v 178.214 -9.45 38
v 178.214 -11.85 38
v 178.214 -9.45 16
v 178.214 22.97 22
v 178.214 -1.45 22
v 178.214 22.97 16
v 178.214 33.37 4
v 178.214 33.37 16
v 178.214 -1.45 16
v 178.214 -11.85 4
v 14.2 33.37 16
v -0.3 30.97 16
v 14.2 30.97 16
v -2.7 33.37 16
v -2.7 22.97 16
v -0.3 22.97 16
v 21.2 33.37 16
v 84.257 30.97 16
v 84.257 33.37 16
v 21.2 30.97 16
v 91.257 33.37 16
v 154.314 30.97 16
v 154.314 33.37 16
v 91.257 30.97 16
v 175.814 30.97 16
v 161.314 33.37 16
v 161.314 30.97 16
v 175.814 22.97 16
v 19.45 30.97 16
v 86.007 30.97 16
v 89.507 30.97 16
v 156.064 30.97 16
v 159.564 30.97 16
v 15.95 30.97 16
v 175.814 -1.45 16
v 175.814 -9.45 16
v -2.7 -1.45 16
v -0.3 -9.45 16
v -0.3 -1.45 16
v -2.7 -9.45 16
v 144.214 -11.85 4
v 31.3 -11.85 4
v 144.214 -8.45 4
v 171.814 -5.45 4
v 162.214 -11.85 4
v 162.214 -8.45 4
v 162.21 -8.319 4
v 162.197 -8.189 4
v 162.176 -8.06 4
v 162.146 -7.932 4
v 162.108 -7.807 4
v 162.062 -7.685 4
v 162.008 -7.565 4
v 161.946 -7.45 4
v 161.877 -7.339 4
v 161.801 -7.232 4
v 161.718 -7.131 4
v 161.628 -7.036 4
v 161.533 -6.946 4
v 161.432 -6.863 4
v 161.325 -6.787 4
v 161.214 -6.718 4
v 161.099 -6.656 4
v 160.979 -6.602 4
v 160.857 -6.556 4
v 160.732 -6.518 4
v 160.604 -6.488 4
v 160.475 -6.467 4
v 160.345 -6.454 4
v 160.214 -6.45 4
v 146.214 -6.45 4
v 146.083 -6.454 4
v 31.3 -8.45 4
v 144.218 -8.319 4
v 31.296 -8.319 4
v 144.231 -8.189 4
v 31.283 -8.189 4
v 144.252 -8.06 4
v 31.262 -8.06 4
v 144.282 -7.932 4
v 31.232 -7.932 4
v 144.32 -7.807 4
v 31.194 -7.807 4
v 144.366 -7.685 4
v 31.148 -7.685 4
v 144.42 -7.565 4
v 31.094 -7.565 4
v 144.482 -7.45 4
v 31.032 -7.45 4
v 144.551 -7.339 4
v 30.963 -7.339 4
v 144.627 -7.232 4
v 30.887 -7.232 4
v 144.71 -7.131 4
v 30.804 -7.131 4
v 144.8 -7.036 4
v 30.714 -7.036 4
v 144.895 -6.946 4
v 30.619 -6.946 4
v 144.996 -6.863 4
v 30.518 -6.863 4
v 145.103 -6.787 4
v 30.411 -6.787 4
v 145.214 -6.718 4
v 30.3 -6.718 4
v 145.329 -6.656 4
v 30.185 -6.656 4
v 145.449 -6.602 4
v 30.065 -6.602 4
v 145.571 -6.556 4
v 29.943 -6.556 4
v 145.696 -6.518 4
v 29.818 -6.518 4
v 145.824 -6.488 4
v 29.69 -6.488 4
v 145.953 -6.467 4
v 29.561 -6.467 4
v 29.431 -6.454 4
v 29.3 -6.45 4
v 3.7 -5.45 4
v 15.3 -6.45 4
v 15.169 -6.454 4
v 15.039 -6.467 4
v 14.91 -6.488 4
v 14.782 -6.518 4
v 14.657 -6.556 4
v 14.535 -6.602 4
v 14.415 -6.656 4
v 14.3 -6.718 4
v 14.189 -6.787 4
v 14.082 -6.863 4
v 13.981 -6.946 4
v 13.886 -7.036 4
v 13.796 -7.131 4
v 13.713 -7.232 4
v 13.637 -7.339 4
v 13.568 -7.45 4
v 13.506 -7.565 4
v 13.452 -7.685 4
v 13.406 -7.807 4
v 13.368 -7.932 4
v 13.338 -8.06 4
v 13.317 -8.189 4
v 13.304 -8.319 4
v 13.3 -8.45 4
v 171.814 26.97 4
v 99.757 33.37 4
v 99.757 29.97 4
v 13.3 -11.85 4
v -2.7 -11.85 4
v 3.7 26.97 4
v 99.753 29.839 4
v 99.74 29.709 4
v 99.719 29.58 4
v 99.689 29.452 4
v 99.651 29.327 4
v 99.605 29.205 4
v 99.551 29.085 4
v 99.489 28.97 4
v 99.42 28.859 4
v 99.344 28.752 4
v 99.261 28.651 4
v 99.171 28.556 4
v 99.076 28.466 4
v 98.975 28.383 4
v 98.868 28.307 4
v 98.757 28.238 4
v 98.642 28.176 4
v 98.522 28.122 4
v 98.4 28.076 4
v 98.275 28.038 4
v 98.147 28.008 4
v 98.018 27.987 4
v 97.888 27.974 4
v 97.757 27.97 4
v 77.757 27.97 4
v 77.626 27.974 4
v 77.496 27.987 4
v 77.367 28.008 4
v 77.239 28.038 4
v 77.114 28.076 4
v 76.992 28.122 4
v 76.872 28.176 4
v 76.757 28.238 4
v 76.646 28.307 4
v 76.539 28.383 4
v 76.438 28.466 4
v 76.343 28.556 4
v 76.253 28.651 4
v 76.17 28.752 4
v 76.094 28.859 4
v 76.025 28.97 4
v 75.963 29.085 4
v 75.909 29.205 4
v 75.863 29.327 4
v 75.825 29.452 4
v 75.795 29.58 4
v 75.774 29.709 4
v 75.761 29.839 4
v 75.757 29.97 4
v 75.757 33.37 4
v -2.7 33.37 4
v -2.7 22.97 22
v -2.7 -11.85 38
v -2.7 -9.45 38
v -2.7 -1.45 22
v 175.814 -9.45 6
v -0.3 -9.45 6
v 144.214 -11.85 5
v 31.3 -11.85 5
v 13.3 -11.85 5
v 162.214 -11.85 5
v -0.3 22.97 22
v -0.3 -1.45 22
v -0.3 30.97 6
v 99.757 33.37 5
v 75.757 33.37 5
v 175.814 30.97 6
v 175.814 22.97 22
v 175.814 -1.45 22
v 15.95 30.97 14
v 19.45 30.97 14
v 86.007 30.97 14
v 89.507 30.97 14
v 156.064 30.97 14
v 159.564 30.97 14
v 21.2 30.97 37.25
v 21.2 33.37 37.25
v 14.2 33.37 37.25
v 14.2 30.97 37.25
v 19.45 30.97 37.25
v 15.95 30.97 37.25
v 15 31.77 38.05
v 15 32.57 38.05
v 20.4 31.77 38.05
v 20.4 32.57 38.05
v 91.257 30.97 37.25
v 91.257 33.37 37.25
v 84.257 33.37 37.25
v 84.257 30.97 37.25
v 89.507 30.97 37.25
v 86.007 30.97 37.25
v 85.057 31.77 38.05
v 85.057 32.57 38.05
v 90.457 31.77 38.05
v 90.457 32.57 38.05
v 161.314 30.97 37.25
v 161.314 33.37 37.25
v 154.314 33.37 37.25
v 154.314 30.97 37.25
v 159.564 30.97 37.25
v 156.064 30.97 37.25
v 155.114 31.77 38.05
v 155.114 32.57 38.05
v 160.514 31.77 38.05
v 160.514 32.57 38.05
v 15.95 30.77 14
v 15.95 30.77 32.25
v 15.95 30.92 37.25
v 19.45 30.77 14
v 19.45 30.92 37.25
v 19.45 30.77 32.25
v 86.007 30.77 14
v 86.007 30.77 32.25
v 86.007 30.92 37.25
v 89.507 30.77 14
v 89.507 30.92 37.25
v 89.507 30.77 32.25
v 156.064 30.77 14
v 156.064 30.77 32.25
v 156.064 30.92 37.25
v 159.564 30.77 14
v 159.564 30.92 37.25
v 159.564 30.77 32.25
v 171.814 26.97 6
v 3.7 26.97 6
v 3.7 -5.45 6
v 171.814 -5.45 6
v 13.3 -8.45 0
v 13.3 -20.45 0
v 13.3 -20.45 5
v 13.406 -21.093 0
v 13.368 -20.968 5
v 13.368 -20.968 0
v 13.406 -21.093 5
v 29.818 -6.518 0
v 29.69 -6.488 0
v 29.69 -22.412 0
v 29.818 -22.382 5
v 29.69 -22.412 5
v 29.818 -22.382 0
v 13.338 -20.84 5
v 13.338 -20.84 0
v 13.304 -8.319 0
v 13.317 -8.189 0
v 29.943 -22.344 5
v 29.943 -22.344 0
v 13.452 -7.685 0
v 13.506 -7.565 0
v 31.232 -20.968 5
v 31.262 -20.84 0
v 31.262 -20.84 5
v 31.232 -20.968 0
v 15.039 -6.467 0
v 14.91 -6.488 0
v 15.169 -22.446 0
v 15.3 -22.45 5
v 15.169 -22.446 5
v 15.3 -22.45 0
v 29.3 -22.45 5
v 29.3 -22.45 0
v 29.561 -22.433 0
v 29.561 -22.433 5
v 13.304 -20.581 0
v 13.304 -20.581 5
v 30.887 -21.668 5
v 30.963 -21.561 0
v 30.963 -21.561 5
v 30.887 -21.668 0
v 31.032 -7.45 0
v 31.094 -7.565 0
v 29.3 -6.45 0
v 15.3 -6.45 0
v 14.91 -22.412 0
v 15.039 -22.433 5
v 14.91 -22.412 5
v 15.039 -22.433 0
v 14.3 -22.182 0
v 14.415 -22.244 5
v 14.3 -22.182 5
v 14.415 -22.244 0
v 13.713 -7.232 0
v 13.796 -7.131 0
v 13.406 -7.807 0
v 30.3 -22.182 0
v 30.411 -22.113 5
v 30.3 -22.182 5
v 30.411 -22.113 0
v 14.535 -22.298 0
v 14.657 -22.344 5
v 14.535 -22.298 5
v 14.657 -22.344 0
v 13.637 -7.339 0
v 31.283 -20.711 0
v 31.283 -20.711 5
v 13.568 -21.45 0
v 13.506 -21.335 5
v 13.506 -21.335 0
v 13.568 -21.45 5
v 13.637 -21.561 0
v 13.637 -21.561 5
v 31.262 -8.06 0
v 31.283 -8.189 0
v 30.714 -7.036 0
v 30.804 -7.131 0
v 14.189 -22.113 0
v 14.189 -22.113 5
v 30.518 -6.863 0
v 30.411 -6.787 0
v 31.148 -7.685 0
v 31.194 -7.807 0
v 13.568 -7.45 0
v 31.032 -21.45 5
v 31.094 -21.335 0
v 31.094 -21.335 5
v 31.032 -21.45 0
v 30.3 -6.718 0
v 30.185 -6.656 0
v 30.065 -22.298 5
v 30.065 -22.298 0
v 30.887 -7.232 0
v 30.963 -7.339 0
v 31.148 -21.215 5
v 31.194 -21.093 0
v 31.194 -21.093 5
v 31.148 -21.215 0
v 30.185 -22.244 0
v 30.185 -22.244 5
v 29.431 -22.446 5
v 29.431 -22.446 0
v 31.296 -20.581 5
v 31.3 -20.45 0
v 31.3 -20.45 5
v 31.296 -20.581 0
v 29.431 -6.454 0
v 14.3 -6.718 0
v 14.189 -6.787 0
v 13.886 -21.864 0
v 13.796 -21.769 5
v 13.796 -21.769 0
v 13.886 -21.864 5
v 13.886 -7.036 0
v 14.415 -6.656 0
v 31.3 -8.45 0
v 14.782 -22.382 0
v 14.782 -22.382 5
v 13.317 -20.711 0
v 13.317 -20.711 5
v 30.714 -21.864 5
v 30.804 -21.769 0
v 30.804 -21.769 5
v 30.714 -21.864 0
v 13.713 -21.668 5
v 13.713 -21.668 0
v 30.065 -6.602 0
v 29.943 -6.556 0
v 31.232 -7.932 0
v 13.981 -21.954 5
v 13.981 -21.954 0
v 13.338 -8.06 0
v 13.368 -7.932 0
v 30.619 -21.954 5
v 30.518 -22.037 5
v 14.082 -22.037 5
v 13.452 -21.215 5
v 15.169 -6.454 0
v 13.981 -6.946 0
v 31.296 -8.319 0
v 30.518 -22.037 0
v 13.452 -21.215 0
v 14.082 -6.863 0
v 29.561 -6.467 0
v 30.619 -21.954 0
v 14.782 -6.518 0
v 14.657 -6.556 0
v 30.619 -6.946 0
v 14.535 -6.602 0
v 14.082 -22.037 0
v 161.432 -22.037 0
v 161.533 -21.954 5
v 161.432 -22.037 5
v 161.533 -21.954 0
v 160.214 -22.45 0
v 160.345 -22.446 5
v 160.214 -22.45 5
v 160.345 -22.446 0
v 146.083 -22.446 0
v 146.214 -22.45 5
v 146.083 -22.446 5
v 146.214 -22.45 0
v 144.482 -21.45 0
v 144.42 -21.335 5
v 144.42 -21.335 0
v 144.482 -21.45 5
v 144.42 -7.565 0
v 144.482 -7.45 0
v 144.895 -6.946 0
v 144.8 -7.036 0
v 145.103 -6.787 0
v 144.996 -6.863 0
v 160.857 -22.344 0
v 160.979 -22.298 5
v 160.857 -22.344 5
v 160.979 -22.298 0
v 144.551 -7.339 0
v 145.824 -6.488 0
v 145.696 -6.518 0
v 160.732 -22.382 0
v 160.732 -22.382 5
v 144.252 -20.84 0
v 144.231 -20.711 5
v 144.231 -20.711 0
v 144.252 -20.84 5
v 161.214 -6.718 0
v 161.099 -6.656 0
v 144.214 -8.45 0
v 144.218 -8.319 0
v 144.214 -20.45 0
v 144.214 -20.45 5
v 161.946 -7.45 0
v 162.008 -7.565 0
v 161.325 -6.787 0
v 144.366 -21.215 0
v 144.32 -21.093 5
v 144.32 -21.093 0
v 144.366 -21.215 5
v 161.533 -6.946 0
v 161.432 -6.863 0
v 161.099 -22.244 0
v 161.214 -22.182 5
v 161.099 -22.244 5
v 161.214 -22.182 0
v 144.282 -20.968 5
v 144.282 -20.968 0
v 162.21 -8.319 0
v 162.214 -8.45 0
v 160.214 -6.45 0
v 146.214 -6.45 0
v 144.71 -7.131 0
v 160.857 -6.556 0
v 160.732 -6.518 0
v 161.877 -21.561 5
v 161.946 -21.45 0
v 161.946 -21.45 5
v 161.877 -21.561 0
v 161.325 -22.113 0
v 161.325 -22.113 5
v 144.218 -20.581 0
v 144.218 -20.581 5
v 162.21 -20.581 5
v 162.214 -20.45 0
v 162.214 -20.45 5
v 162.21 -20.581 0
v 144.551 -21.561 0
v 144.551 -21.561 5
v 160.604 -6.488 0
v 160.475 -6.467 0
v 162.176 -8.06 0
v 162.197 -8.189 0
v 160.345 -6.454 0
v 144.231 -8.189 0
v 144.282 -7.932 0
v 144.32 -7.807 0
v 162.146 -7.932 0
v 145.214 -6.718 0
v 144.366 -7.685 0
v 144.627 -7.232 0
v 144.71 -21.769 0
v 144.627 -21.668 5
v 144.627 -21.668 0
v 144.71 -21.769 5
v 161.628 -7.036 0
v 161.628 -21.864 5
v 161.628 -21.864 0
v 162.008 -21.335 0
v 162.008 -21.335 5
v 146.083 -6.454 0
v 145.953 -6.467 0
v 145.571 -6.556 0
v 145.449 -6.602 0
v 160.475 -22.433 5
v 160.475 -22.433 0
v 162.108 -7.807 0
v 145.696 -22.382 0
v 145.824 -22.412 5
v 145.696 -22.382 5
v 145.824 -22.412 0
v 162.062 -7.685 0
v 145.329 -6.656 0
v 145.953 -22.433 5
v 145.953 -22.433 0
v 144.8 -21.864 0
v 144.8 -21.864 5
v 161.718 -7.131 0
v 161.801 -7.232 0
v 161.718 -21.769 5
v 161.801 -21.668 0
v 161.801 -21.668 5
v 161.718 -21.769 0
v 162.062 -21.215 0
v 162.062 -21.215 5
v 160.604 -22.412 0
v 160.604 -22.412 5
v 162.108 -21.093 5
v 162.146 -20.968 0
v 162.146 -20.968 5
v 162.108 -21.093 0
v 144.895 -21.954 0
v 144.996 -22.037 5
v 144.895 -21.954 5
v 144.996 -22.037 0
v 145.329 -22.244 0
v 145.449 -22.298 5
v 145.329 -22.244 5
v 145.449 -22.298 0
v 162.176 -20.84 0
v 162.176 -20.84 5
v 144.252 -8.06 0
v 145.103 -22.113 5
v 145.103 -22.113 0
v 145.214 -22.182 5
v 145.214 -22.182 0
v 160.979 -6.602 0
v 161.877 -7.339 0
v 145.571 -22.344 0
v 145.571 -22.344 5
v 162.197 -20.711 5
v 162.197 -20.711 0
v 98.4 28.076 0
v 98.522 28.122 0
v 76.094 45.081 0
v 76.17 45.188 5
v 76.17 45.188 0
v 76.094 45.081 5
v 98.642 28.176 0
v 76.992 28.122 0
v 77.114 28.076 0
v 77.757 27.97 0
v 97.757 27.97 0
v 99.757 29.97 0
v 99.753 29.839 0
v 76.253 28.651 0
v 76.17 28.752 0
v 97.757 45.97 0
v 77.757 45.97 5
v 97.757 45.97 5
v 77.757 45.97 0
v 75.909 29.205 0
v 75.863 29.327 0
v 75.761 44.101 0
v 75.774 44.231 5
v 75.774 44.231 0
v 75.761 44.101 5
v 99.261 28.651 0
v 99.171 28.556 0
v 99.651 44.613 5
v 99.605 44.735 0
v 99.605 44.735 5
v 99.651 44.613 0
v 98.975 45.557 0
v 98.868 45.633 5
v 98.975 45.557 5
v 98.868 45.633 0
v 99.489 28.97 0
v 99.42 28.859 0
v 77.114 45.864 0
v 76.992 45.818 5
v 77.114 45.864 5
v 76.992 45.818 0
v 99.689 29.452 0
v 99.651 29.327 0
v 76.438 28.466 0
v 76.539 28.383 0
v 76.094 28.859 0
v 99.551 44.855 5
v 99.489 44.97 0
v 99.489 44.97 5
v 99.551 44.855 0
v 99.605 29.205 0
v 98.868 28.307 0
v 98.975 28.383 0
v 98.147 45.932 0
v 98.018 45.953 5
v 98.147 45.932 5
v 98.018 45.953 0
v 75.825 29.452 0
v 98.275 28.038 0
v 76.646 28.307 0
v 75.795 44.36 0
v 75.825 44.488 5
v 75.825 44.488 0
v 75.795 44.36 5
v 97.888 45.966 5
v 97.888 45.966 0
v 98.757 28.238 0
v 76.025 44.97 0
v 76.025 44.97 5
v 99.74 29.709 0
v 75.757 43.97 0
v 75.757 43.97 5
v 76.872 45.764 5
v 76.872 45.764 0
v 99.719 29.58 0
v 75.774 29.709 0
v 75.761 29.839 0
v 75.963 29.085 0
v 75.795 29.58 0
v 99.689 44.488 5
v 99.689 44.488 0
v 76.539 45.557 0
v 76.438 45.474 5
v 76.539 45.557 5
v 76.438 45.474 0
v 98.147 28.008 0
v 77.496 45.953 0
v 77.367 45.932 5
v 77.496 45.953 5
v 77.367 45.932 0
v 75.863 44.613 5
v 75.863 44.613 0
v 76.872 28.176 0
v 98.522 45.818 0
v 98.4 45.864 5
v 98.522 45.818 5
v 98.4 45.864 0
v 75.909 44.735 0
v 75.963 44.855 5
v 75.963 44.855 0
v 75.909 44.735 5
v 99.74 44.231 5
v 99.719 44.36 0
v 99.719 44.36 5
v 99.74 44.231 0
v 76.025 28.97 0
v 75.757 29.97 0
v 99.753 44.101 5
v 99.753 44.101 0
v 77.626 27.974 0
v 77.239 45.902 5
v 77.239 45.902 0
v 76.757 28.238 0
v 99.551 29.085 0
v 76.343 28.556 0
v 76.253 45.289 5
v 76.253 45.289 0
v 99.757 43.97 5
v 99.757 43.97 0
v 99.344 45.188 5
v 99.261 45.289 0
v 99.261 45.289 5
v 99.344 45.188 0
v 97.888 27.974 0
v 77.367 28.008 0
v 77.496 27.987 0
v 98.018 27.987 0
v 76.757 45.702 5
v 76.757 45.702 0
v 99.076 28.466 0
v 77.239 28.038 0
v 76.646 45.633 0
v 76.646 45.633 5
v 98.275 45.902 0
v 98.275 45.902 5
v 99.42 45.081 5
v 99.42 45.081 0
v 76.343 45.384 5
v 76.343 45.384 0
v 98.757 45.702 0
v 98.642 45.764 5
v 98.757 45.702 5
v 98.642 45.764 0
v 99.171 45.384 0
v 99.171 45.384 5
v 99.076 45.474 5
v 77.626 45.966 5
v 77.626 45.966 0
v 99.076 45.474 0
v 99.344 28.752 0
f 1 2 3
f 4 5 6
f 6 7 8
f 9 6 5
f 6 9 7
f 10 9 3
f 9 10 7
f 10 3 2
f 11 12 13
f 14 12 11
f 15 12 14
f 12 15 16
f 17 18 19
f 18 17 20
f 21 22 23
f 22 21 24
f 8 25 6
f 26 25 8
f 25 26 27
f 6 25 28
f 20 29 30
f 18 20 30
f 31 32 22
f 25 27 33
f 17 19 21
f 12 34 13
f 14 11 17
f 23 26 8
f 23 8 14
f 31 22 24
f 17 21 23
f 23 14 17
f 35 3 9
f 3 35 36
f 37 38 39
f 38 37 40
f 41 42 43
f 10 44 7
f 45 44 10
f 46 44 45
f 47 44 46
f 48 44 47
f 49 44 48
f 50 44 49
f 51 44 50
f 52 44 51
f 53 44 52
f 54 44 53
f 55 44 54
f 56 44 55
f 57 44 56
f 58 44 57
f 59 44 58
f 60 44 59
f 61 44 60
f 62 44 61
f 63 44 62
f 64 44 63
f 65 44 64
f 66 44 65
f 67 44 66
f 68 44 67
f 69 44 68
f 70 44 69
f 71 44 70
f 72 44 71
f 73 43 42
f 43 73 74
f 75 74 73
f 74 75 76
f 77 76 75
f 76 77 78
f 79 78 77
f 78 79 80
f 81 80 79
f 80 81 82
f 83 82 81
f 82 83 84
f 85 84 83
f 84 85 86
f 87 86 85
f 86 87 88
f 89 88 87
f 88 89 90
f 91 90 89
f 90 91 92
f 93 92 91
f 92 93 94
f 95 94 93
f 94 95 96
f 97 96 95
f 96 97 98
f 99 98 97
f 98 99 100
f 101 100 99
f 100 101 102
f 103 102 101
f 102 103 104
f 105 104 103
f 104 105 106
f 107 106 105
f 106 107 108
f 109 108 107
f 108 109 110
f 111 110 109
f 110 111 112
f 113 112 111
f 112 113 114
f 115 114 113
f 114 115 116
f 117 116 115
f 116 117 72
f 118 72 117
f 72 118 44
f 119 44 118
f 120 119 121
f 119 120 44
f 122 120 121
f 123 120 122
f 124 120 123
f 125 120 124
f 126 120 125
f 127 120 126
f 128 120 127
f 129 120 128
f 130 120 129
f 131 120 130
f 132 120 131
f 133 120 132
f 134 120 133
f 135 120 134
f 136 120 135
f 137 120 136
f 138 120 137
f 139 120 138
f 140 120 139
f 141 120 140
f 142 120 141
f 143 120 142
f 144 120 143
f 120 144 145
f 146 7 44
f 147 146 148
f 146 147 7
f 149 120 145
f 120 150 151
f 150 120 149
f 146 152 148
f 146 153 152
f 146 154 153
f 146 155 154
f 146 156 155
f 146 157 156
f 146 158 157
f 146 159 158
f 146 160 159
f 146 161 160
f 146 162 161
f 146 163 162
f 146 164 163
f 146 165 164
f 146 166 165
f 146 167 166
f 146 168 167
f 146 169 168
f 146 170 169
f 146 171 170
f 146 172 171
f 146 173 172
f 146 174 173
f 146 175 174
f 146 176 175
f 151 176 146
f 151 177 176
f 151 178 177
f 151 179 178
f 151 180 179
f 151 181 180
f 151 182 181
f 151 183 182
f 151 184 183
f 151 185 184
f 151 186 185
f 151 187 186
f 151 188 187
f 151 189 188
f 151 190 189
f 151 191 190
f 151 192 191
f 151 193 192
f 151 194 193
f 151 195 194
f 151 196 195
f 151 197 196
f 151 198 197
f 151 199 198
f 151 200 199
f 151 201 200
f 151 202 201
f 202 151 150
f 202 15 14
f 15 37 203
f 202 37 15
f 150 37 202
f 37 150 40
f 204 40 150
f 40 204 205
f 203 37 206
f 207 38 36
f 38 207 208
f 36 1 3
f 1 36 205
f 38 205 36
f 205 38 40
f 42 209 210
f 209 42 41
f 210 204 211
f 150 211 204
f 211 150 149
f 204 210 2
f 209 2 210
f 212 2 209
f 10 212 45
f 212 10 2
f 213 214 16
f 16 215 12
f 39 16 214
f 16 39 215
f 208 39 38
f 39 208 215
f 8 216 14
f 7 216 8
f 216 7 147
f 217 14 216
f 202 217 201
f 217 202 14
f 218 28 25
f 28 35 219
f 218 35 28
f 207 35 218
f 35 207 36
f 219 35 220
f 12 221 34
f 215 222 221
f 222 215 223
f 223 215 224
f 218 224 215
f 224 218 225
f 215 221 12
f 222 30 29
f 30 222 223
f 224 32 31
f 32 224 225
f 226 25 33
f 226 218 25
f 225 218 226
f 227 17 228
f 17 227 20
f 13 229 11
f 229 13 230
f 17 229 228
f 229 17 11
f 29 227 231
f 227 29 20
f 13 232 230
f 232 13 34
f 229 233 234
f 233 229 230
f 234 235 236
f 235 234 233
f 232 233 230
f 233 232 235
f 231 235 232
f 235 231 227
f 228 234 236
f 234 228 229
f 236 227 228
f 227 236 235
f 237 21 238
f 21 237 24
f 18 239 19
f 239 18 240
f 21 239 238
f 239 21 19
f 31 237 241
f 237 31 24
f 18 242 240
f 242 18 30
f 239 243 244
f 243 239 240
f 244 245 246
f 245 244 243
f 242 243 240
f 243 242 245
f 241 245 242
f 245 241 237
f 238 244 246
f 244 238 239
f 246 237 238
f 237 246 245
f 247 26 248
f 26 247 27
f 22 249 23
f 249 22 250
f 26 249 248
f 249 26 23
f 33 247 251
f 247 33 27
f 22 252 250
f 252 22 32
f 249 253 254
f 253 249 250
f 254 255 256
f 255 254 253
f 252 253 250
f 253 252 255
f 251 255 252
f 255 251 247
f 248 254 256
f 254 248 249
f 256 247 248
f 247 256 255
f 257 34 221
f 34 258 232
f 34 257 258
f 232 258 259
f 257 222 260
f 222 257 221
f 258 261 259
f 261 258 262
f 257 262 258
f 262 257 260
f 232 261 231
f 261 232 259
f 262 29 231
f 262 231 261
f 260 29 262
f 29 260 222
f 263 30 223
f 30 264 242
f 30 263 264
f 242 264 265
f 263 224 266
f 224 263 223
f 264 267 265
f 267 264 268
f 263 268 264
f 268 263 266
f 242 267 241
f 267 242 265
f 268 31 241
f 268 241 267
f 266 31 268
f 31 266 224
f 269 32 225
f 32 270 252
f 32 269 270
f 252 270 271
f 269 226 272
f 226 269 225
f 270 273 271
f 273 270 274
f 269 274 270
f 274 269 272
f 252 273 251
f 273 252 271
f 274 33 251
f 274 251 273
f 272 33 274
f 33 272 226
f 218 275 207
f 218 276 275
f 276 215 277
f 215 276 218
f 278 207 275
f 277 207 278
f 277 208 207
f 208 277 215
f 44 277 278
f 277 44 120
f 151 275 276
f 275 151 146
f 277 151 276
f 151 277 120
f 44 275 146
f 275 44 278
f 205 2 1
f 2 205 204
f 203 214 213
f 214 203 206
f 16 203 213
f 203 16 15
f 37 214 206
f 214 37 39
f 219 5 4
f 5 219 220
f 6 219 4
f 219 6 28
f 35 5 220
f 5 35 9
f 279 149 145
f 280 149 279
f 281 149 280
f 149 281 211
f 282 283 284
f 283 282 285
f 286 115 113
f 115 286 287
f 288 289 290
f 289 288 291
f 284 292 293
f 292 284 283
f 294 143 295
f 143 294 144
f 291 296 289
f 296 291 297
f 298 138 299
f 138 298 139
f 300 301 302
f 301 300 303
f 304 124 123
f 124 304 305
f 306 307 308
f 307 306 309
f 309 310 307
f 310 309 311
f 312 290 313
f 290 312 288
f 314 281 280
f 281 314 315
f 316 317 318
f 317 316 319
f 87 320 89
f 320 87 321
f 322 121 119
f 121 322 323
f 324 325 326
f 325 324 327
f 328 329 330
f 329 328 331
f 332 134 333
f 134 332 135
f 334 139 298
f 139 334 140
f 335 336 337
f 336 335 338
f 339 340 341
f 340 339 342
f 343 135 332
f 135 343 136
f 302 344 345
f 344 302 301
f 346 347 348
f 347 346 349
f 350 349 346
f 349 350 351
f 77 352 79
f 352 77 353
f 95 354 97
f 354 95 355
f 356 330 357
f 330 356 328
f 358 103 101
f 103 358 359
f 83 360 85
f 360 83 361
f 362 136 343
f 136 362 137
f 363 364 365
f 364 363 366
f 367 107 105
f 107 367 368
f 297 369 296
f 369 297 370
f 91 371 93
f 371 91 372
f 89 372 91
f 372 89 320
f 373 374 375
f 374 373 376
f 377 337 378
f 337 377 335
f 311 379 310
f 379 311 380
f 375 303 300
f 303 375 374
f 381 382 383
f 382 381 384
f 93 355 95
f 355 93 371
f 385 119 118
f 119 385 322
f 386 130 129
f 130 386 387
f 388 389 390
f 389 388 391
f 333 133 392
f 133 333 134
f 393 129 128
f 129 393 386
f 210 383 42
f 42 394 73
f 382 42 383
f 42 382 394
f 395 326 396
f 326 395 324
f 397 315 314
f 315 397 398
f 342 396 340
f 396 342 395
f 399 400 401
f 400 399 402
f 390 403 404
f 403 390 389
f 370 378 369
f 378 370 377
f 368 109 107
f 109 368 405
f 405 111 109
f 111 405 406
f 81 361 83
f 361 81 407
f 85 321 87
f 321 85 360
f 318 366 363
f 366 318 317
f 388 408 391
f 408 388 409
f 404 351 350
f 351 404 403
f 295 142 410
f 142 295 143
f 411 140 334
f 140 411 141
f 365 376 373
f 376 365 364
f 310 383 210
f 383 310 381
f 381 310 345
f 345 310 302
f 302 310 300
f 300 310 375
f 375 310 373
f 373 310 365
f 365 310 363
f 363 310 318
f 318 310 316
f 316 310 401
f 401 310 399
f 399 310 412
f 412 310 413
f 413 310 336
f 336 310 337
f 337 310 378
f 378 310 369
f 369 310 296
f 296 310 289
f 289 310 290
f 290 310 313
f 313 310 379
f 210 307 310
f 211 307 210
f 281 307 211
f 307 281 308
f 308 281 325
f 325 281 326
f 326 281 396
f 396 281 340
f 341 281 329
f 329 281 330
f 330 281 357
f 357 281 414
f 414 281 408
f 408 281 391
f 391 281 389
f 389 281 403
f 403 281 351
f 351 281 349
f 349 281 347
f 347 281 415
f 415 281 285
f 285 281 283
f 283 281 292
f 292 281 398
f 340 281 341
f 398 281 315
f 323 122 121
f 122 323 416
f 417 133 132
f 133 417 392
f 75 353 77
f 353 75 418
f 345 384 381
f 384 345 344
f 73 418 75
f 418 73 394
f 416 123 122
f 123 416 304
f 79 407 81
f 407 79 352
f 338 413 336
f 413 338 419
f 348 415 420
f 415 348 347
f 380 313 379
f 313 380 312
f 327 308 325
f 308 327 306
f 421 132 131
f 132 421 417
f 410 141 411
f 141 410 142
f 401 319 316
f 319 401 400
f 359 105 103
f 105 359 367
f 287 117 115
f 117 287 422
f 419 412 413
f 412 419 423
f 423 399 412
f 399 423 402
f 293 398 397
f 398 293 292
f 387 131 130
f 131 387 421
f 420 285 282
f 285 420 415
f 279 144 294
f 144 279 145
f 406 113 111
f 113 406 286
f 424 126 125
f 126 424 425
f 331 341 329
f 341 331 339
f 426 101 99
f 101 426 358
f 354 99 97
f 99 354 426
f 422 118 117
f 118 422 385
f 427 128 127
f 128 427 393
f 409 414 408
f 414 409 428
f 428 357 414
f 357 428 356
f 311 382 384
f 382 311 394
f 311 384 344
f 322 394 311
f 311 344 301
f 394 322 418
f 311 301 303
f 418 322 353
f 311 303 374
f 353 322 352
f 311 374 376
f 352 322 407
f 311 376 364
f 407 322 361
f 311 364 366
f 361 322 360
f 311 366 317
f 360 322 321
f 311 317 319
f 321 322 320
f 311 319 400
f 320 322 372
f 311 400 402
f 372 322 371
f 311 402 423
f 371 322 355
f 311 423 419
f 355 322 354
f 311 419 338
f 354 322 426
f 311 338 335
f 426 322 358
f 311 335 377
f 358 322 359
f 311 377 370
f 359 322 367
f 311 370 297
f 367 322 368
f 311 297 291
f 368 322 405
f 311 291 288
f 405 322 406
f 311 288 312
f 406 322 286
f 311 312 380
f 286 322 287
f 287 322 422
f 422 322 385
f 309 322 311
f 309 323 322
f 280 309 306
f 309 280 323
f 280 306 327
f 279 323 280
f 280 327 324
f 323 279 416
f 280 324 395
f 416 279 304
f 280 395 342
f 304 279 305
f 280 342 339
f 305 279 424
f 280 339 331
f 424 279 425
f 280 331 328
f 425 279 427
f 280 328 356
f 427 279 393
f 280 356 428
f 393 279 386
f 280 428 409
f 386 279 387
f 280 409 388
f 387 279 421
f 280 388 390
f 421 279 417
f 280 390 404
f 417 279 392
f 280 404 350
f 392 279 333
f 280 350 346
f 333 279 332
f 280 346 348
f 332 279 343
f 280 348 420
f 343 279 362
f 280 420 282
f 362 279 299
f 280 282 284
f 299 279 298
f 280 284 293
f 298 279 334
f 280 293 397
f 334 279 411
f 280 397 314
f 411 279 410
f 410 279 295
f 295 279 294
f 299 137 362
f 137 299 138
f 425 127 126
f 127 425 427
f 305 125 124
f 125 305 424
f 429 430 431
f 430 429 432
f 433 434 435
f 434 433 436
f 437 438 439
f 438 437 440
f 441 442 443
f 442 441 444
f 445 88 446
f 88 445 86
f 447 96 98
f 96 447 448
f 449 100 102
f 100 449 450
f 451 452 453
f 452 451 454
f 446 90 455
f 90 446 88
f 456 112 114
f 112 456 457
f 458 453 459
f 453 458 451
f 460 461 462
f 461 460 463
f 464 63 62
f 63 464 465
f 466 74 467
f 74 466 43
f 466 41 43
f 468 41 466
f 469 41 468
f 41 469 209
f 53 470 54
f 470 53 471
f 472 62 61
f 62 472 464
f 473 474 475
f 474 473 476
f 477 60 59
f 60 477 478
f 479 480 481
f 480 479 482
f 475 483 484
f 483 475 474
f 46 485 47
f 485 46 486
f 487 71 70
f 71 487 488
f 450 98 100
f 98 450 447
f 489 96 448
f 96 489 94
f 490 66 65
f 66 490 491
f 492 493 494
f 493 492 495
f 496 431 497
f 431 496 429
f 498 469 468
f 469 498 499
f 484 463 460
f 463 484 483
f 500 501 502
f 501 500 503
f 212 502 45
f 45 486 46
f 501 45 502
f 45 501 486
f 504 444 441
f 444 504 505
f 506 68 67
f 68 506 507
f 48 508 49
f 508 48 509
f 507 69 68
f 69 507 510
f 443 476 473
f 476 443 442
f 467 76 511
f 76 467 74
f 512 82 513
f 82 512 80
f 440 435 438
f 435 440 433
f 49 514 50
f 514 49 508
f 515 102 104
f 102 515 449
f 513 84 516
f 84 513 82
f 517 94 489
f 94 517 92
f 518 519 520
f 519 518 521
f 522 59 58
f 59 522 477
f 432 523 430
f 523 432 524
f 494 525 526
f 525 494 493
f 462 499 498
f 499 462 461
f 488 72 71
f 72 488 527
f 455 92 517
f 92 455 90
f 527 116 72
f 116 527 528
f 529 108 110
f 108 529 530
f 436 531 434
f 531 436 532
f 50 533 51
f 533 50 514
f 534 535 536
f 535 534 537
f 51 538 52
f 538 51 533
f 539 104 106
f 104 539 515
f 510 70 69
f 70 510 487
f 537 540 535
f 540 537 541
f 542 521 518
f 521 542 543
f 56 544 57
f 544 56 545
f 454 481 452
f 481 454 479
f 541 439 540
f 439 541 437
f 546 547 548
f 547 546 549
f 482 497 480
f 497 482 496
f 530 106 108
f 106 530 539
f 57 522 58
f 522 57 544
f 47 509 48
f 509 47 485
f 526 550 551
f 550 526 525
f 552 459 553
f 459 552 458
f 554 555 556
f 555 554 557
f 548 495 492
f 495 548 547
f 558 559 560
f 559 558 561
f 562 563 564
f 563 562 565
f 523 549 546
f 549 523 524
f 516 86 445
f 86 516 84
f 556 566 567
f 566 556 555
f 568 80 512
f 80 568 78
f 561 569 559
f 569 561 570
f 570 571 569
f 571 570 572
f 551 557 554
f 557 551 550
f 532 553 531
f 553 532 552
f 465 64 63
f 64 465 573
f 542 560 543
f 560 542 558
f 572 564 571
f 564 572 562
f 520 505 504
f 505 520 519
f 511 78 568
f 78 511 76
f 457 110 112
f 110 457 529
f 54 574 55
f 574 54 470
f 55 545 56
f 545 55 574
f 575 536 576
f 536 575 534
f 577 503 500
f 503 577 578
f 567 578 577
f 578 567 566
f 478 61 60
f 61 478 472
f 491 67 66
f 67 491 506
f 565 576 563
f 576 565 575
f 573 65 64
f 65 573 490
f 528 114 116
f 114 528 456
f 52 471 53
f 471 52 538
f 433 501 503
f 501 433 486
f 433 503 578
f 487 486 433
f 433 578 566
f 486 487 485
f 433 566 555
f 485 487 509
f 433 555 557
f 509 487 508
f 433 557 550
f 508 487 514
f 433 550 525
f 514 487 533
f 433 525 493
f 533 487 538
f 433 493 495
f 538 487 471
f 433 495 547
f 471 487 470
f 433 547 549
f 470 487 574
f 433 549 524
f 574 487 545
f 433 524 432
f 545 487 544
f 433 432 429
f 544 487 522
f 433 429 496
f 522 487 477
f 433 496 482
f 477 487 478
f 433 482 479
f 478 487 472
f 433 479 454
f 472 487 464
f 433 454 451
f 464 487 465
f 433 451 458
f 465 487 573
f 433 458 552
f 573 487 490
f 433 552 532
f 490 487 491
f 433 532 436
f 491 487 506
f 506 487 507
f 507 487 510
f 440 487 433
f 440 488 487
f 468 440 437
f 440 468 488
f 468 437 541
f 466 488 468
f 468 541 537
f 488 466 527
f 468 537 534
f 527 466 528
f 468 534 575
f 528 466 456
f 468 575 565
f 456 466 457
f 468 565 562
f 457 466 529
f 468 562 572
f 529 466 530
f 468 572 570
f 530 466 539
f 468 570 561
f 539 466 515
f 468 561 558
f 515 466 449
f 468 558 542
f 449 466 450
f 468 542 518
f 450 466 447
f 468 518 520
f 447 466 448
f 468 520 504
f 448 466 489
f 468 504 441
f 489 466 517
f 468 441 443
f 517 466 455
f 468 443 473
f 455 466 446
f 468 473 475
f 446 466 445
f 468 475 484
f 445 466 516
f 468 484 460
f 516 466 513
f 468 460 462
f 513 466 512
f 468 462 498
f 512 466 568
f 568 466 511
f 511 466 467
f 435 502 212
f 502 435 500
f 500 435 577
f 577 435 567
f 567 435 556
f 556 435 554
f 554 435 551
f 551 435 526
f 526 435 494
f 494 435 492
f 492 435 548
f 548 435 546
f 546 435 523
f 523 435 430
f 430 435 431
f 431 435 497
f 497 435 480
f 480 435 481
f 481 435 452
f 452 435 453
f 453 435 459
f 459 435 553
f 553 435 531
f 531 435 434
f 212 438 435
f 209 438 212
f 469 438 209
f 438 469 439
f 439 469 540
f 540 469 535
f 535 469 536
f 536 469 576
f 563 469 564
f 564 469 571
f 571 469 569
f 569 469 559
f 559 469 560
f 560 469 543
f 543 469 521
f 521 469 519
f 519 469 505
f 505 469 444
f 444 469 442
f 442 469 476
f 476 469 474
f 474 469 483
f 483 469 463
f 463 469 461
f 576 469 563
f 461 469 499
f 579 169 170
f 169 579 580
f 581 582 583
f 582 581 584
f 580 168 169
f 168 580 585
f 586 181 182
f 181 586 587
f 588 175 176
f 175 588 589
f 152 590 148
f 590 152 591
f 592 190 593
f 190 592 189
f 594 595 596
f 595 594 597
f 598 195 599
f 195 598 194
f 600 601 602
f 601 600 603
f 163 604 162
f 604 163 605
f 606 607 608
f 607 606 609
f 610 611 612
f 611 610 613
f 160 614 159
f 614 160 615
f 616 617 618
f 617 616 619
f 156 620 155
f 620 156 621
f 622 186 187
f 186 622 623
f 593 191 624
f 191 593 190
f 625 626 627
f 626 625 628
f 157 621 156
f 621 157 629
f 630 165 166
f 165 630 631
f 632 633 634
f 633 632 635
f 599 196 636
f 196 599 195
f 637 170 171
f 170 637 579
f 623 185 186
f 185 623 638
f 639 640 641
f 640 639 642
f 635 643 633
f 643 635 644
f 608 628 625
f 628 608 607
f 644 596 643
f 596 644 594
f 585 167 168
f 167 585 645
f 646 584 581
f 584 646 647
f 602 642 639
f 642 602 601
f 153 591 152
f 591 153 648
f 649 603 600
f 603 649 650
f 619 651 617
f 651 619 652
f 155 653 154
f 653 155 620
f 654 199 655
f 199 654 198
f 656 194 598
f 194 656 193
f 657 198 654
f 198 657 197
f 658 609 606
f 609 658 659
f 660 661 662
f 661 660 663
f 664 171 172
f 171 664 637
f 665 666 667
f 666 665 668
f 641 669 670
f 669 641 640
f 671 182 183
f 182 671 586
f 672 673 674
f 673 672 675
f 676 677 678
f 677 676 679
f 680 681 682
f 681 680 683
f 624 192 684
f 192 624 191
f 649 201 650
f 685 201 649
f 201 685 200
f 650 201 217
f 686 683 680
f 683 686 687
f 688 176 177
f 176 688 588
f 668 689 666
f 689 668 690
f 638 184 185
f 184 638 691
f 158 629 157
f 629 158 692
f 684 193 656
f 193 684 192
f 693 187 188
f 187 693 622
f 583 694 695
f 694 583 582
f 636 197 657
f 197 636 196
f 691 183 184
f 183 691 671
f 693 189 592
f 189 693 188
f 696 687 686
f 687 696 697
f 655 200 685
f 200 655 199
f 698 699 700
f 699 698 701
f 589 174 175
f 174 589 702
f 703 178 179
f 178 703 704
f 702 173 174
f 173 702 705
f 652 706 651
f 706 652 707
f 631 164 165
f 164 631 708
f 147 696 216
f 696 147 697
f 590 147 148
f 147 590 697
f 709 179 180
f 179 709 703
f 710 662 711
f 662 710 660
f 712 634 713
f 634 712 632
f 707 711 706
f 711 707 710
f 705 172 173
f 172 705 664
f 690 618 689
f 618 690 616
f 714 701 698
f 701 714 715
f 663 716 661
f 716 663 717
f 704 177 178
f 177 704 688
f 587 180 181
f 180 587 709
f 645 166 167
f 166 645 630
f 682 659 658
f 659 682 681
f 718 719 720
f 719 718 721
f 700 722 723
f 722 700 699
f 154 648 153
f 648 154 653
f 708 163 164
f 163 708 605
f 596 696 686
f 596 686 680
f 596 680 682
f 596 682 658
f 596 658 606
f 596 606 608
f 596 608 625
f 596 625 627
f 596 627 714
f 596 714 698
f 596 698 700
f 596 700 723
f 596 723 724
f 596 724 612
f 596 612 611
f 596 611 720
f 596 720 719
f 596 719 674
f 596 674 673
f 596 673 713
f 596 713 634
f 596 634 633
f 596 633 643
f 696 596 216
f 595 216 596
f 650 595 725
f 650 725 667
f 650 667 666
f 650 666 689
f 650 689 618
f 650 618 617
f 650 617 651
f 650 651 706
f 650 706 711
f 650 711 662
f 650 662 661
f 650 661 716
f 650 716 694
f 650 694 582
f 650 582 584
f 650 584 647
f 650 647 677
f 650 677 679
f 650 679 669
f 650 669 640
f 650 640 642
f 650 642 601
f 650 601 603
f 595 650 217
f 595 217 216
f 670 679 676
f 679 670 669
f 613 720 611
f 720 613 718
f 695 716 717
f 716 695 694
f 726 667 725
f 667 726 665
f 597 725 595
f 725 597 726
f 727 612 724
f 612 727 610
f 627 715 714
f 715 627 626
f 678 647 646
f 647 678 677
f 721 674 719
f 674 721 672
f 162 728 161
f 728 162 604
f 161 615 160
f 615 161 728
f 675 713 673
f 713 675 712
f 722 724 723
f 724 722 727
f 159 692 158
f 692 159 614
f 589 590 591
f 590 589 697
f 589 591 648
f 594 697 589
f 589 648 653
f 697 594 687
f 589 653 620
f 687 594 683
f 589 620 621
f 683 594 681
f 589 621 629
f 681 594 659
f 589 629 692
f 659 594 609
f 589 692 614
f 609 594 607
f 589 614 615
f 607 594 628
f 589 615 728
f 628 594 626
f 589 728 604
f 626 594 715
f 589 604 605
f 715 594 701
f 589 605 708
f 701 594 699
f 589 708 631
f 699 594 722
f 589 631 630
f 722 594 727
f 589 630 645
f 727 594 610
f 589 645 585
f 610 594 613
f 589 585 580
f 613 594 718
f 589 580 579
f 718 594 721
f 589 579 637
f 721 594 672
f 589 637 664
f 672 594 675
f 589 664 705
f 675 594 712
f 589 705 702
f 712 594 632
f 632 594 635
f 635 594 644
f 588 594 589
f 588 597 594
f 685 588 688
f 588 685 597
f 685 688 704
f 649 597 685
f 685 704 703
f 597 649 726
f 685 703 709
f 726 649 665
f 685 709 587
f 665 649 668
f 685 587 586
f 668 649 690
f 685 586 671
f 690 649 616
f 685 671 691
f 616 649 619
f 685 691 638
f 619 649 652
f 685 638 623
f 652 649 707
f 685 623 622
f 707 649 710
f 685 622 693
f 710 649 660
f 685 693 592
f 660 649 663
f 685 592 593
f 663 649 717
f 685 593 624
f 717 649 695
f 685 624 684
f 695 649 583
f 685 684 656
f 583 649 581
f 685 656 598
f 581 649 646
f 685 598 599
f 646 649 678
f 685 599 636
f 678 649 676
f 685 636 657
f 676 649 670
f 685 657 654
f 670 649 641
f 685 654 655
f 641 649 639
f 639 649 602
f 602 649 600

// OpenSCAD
// DOUBLE TAKE FRAMES DESIGN RELEASE
// DTF_RELEASE: 2.0.1
// Released: 2026-09-02
// Versioning: Semantic Versioning 2.0.0 (https://semver.org/)
// Status: CANONICAL
// Changes in 2.0.1:
// - Carried forward unchanged for the prepared-project packaging correction.
// Changes in 2.0.0:
// - Carried forward without geometry changes for the coordinated 2.0.0 release.
// Full release notes: https://doubletakeframes.com/build/#design-release
//
$fn = 96;
eps = 0.05;

// =========================================================
// DETACHABLE FRONT BAND + SIDE WALLS + REAR POSTS + FEETS
// Continuous low rail all around.
// Side walls sit on rail but do not connect to front/back above rail.
// Non-friction resting fit.
//
// Corrected:
// - Feet overlap collar/body in Z by foot_body_z_overlap, not just eps.
// - Each foot is shifted a few mm inward under the basket while keeping
//   the original front/rear foot depth.
// =========================================================

inch = 25.4;

// CASSETTE REFERENCE VALUES
cassette_w = 6.91 * inch;

bottom_t    = 3.0;
wall_t      = 3.0;
wall_offset = 0.0;

front_frame_t    = 1.2;
acrylic_gap      = 1.0;
spacer_thickness = 7.0;

front_buildout_total = front_frame_t + acrylic_gap + spacer_thickness;
front_buildout_y0    = wall_offset - front_buildout_total;

roller_r    = 0.75 * inch;
glide_t     = 2.0;
fang_embed  = 0.6;
rail_back_y = 8.0;
roller_cy   = wall_offset + wall_t;

glide_y  = roller_cy + roller_r - glide_t - fang_embed;
bottom_d = glide_y + glide_t + rail_back_y;

backing_board_extra_y = 1/20 * inch;

cassette_x0 = 0;
cassette_x1 = cassette_w;
cassette_y0 = front_buildout_y0;
cassette_y1 = bottom_d + backing_board_extra_y;

// FIT / GEOMETRY
clear_x = 0.3;
clear_y = 0.25;

collar_t = 2.4;

foot_h = 5.0;
foot_body_z_overlap = 1.0;
collar_z0 = foot_h - foot_body_z_overlap;

collar_h = 34.0;
side_wall_h = 18.0;
inner_x0 = cassette_x0 - clear_x;
inner_x1 = cassette_x1 + clear_x;
inner_y0 = cassette_y0 - clear_y;
inner_y1 = cassette_y1 + clear_y;

outer_x0 = inner_x0 - collar_t;
outer_x1 = inner_x1 + collar_t;
outer_y0 = inner_y0 - collar_t;
outer_y1 = inner_y1 + collar_t;

// RESTING LEDGE
rest_lip_t = 4.0;
rest_lip_h = 2.0;

// LOW RAIL
low_rail_h = 12.0;

// SIDE WALLS
side_wall_gap_front = 8.0;
side_wall_gap_rear  = 8.0;
side_wall_t = collar_t;

// REAR POSTS
rear_post_w = 7.0;
rear_post_t = collar_t;
post_bevel = 0.8;

// Localized friction take-up on the three rear backing-board capture posts.
// These project into the existing Y clearance without moving the posts or
// tightening the stand's overall envelope. The upper ramp eases insertion.
rear_post_friction_pad_d = 0.20;
rear_post_friction_pad_w = 3.5;
rear_post_friction_pad_z0 = collar_z0 + low_rail_h - 2.0;
rear_post_friction_pad_z1 = collar_z0 + collar_h - post_bevel;
rear_post_friction_ramp_h = 5.0;

// FEET
front_foot_proj = 16.0;
rear_foot_proj  = 18.0;

front_foot_w = 18.0;
rear_foot_w  = 24.0;

front_foot_inset_x = 16.0;
foot_round = 2.0;

// How far the inner edge of each foot reaches under the basket.
// Original effectively stopped ~0.6 mm short of the inner edge.
foot_y_overlap = 3.0;

// HELPERS
module rounded_rect_prism(x0, x1, y0, y1, z0, z1, r=2) {
    hull() {
        translate([x0+r, y0+r, z0]) cylinder(r=r, h=z1-z0);
        translate([x1-r, y0+r, z0]) cylinder(r=r, h=z1-z0);
        translate([x0+r, y1-r, z0]) cylinder(r=r, h=z1-z0);
        translate([x1-r, y1-r, z0]) cylinder(r=r, h=z1-z0);
    }
}

module beveled_post(xsz, ysz, h, b) {
    bx = min(b, xsz/2 - eps);
    by = min(b, ysz/2 - eps);

    union() {
        cube([xsz, ysz, h - b]);

        translate([0, 0, h - b])
        hull() {
            cube([xsz, ysz, eps]);

            translate([bx, by, b])
                cube([
                    max(eps, xsz - 2*bx),
                    max(eps, ysz - 2*by),
                    eps
                ]);
        }
    }
}

// FRONT BAND
module front_band() {
    translate([outer_x0, outer_y0, collar_z0])
        cube([
            outer_x1 - outer_x0,
            collar_t,
            collar_h
        ]);
}

// CONTINUOUS LOW RAIL
module front_low_rail() {
    translate([outer_x0, outer_y0, collar_z0])
        cube([outer_x1 - outer_x0, collar_t, low_rail_h]);
}

module left_low_rail() {
    translate([outer_x0, outer_y0, collar_z0])
        cube([collar_t, outer_y1 - outer_y0, low_rail_h]);
}

module right_low_rail() {
    translate([outer_x1 - collar_t, outer_y0, collar_z0])
        cube([collar_t, outer_y1 - outer_y0, low_rail_h]);
}

module rear_low_rail() {
    translate([outer_x0, outer_y1 - collar_t, collar_z0])
        cube([outer_x1 - outer_x0, collar_t, low_rail_h]);
}

module low_rails() {
    // front rail overlaps lower part of front band; harmless and strengthens base
    front_low_rail();
    left_low_rail();
    right_low_rail();
    rear_low_rail();
}

// SIDE WALLS
module left_side_wall() {
    y0 = inner_y0 + side_wall_gap_front;
    y1 = inner_y1 - side_wall_gap_rear;

    translate([outer_x0, y0, collar_z0])
        cube([
            side_wall_t,
            y1 - y0,
            side_wall_h
        ]);
}

module right_side_wall() {
    y0 = inner_y0 + side_wall_gap_front;
    y1 = inner_y1 - side_wall_gap_rear;

    translate([inner_x1, y0, collar_z0])
        cube([
            side_wall_t,
            y1 - y0,
            side_wall_h
        ]);
}

// REAR POSTS
module rear_post(x_center) {
    translate([x_center - rear_post_w/2, inner_y1, collar_z0])
        beveled_post(rear_post_w, rear_post_t, collar_h, post_bevel);
}

module rear_post_friction_pad(x_center) {
    pad_x0 = x_center - rear_post_friction_pad_w/2;
    full_pad_y0 = inner_y1 - rear_post_friction_pad_d;
    ramp_z0 = rear_post_friction_pad_z1 - rear_post_friction_ramp_h;

    hull() {
        translate([pad_x0, full_pad_y0, rear_post_friction_pad_z0])
            cube([rear_post_friction_pad_w, rear_post_friction_pad_d + eps, eps]);
        translate([pad_x0, full_pad_y0, ramp_z0])
            cube([rear_post_friction_pad_w, rear_post_friction_pad_d + eps, eps]);
        translate([pad_x0, inner_y1 - eps, rear_post_friction_pad_z1])
            cube([rear_post_friction_pad_w, 2*eps, eps]);
    }
}

module rear_posts() {
    left_post_x = inner_x0 + 18.0;
    center_post_x = (inner_x0 + inner_x1) / 2;
    right_post_x = inner_x1 - 18.0;

    rear_post(left_post_x);
    rear_post(center_post_x);
    rear_post(right_post_x);

    rear_post_friction_pad(left_post_x);
    rear_post_friction_pad(center_post_x);
    rear_post_friction_pad(right_post_x);
}

// BOTTOM RESTING LEDGE
module bottom_rest_lip() {
    translate([inner_x0, inner_y0, collar_z0])
        cube([inner_x1 - inner_x0, rest_lip_t, rest_lip_h]);

    translate([inner_x0, inner_y1 - rest_lip_t, collar_z0])
        cube([inner_x1 - inner_x0, rest_lip_t, rest_lip_h]);

    translate([inner_x0, inner_y0, collar_z0])
        cube([rest_lip_t, inner_y1 - inner_y0, rest_lip_h]);

    translate([inner_x1 - rest_lip_t, inner_y0, collar_z0])
        cube([rest_lip_t, inner_y1 - inner_y0, rest_lip_h]);
}

// FEET
module front_left_foot() {
    x0 = outer_x0 + front_foot_inset_x;
    x1 = x0 + front_foot_w;

    // Same foot depth as original, shifted inward for a few mm of underlap.
    y1 = inner_y0 + foot_y_overlap;
    y0 = y1 - front_foot_proj;

    rounded_rect_prism(x0, x1, y0, y1, 0, foot_h, foot_round);
}

module front_right_foot() {
    x1 = outer_x1 - front_foot_inset_x;
    x0 = x1 - front_foot_w;

    // Same foot depth as original, shifted inward for a few mm of underlap.
    y1 = inner_y0 + foot_y_overlap;
    y0 = y1 - front_foot_proj;

    rounded_rect_prism(x0, x1, y0, y1, 0, foot_h, foot_round);
}

module rear_center_foot() {
    x0 = (outer_x0 + outer_x1)/2 - rear_foot_w/2;
    x1 = x0 + rear_foot_w;

    // Same foot depth as original, shifted inward for a few mm of underlap.
    y0 = inner_y1 - foot_y_overlap;
    y1 = y0 + rear_foot_proj;

    rounded_rect_prism(x0, x1, y0, y1, 0, foot_h, foot_round);
}

// FINAL
union() {
    front_band();
    low_rails();

    left_side_wall();
    right_side_wall();
    rear_posts();

    bottom_rest_lip();

    front_left_foot();
    front_right_foot();
    rear_center_foot();
}
